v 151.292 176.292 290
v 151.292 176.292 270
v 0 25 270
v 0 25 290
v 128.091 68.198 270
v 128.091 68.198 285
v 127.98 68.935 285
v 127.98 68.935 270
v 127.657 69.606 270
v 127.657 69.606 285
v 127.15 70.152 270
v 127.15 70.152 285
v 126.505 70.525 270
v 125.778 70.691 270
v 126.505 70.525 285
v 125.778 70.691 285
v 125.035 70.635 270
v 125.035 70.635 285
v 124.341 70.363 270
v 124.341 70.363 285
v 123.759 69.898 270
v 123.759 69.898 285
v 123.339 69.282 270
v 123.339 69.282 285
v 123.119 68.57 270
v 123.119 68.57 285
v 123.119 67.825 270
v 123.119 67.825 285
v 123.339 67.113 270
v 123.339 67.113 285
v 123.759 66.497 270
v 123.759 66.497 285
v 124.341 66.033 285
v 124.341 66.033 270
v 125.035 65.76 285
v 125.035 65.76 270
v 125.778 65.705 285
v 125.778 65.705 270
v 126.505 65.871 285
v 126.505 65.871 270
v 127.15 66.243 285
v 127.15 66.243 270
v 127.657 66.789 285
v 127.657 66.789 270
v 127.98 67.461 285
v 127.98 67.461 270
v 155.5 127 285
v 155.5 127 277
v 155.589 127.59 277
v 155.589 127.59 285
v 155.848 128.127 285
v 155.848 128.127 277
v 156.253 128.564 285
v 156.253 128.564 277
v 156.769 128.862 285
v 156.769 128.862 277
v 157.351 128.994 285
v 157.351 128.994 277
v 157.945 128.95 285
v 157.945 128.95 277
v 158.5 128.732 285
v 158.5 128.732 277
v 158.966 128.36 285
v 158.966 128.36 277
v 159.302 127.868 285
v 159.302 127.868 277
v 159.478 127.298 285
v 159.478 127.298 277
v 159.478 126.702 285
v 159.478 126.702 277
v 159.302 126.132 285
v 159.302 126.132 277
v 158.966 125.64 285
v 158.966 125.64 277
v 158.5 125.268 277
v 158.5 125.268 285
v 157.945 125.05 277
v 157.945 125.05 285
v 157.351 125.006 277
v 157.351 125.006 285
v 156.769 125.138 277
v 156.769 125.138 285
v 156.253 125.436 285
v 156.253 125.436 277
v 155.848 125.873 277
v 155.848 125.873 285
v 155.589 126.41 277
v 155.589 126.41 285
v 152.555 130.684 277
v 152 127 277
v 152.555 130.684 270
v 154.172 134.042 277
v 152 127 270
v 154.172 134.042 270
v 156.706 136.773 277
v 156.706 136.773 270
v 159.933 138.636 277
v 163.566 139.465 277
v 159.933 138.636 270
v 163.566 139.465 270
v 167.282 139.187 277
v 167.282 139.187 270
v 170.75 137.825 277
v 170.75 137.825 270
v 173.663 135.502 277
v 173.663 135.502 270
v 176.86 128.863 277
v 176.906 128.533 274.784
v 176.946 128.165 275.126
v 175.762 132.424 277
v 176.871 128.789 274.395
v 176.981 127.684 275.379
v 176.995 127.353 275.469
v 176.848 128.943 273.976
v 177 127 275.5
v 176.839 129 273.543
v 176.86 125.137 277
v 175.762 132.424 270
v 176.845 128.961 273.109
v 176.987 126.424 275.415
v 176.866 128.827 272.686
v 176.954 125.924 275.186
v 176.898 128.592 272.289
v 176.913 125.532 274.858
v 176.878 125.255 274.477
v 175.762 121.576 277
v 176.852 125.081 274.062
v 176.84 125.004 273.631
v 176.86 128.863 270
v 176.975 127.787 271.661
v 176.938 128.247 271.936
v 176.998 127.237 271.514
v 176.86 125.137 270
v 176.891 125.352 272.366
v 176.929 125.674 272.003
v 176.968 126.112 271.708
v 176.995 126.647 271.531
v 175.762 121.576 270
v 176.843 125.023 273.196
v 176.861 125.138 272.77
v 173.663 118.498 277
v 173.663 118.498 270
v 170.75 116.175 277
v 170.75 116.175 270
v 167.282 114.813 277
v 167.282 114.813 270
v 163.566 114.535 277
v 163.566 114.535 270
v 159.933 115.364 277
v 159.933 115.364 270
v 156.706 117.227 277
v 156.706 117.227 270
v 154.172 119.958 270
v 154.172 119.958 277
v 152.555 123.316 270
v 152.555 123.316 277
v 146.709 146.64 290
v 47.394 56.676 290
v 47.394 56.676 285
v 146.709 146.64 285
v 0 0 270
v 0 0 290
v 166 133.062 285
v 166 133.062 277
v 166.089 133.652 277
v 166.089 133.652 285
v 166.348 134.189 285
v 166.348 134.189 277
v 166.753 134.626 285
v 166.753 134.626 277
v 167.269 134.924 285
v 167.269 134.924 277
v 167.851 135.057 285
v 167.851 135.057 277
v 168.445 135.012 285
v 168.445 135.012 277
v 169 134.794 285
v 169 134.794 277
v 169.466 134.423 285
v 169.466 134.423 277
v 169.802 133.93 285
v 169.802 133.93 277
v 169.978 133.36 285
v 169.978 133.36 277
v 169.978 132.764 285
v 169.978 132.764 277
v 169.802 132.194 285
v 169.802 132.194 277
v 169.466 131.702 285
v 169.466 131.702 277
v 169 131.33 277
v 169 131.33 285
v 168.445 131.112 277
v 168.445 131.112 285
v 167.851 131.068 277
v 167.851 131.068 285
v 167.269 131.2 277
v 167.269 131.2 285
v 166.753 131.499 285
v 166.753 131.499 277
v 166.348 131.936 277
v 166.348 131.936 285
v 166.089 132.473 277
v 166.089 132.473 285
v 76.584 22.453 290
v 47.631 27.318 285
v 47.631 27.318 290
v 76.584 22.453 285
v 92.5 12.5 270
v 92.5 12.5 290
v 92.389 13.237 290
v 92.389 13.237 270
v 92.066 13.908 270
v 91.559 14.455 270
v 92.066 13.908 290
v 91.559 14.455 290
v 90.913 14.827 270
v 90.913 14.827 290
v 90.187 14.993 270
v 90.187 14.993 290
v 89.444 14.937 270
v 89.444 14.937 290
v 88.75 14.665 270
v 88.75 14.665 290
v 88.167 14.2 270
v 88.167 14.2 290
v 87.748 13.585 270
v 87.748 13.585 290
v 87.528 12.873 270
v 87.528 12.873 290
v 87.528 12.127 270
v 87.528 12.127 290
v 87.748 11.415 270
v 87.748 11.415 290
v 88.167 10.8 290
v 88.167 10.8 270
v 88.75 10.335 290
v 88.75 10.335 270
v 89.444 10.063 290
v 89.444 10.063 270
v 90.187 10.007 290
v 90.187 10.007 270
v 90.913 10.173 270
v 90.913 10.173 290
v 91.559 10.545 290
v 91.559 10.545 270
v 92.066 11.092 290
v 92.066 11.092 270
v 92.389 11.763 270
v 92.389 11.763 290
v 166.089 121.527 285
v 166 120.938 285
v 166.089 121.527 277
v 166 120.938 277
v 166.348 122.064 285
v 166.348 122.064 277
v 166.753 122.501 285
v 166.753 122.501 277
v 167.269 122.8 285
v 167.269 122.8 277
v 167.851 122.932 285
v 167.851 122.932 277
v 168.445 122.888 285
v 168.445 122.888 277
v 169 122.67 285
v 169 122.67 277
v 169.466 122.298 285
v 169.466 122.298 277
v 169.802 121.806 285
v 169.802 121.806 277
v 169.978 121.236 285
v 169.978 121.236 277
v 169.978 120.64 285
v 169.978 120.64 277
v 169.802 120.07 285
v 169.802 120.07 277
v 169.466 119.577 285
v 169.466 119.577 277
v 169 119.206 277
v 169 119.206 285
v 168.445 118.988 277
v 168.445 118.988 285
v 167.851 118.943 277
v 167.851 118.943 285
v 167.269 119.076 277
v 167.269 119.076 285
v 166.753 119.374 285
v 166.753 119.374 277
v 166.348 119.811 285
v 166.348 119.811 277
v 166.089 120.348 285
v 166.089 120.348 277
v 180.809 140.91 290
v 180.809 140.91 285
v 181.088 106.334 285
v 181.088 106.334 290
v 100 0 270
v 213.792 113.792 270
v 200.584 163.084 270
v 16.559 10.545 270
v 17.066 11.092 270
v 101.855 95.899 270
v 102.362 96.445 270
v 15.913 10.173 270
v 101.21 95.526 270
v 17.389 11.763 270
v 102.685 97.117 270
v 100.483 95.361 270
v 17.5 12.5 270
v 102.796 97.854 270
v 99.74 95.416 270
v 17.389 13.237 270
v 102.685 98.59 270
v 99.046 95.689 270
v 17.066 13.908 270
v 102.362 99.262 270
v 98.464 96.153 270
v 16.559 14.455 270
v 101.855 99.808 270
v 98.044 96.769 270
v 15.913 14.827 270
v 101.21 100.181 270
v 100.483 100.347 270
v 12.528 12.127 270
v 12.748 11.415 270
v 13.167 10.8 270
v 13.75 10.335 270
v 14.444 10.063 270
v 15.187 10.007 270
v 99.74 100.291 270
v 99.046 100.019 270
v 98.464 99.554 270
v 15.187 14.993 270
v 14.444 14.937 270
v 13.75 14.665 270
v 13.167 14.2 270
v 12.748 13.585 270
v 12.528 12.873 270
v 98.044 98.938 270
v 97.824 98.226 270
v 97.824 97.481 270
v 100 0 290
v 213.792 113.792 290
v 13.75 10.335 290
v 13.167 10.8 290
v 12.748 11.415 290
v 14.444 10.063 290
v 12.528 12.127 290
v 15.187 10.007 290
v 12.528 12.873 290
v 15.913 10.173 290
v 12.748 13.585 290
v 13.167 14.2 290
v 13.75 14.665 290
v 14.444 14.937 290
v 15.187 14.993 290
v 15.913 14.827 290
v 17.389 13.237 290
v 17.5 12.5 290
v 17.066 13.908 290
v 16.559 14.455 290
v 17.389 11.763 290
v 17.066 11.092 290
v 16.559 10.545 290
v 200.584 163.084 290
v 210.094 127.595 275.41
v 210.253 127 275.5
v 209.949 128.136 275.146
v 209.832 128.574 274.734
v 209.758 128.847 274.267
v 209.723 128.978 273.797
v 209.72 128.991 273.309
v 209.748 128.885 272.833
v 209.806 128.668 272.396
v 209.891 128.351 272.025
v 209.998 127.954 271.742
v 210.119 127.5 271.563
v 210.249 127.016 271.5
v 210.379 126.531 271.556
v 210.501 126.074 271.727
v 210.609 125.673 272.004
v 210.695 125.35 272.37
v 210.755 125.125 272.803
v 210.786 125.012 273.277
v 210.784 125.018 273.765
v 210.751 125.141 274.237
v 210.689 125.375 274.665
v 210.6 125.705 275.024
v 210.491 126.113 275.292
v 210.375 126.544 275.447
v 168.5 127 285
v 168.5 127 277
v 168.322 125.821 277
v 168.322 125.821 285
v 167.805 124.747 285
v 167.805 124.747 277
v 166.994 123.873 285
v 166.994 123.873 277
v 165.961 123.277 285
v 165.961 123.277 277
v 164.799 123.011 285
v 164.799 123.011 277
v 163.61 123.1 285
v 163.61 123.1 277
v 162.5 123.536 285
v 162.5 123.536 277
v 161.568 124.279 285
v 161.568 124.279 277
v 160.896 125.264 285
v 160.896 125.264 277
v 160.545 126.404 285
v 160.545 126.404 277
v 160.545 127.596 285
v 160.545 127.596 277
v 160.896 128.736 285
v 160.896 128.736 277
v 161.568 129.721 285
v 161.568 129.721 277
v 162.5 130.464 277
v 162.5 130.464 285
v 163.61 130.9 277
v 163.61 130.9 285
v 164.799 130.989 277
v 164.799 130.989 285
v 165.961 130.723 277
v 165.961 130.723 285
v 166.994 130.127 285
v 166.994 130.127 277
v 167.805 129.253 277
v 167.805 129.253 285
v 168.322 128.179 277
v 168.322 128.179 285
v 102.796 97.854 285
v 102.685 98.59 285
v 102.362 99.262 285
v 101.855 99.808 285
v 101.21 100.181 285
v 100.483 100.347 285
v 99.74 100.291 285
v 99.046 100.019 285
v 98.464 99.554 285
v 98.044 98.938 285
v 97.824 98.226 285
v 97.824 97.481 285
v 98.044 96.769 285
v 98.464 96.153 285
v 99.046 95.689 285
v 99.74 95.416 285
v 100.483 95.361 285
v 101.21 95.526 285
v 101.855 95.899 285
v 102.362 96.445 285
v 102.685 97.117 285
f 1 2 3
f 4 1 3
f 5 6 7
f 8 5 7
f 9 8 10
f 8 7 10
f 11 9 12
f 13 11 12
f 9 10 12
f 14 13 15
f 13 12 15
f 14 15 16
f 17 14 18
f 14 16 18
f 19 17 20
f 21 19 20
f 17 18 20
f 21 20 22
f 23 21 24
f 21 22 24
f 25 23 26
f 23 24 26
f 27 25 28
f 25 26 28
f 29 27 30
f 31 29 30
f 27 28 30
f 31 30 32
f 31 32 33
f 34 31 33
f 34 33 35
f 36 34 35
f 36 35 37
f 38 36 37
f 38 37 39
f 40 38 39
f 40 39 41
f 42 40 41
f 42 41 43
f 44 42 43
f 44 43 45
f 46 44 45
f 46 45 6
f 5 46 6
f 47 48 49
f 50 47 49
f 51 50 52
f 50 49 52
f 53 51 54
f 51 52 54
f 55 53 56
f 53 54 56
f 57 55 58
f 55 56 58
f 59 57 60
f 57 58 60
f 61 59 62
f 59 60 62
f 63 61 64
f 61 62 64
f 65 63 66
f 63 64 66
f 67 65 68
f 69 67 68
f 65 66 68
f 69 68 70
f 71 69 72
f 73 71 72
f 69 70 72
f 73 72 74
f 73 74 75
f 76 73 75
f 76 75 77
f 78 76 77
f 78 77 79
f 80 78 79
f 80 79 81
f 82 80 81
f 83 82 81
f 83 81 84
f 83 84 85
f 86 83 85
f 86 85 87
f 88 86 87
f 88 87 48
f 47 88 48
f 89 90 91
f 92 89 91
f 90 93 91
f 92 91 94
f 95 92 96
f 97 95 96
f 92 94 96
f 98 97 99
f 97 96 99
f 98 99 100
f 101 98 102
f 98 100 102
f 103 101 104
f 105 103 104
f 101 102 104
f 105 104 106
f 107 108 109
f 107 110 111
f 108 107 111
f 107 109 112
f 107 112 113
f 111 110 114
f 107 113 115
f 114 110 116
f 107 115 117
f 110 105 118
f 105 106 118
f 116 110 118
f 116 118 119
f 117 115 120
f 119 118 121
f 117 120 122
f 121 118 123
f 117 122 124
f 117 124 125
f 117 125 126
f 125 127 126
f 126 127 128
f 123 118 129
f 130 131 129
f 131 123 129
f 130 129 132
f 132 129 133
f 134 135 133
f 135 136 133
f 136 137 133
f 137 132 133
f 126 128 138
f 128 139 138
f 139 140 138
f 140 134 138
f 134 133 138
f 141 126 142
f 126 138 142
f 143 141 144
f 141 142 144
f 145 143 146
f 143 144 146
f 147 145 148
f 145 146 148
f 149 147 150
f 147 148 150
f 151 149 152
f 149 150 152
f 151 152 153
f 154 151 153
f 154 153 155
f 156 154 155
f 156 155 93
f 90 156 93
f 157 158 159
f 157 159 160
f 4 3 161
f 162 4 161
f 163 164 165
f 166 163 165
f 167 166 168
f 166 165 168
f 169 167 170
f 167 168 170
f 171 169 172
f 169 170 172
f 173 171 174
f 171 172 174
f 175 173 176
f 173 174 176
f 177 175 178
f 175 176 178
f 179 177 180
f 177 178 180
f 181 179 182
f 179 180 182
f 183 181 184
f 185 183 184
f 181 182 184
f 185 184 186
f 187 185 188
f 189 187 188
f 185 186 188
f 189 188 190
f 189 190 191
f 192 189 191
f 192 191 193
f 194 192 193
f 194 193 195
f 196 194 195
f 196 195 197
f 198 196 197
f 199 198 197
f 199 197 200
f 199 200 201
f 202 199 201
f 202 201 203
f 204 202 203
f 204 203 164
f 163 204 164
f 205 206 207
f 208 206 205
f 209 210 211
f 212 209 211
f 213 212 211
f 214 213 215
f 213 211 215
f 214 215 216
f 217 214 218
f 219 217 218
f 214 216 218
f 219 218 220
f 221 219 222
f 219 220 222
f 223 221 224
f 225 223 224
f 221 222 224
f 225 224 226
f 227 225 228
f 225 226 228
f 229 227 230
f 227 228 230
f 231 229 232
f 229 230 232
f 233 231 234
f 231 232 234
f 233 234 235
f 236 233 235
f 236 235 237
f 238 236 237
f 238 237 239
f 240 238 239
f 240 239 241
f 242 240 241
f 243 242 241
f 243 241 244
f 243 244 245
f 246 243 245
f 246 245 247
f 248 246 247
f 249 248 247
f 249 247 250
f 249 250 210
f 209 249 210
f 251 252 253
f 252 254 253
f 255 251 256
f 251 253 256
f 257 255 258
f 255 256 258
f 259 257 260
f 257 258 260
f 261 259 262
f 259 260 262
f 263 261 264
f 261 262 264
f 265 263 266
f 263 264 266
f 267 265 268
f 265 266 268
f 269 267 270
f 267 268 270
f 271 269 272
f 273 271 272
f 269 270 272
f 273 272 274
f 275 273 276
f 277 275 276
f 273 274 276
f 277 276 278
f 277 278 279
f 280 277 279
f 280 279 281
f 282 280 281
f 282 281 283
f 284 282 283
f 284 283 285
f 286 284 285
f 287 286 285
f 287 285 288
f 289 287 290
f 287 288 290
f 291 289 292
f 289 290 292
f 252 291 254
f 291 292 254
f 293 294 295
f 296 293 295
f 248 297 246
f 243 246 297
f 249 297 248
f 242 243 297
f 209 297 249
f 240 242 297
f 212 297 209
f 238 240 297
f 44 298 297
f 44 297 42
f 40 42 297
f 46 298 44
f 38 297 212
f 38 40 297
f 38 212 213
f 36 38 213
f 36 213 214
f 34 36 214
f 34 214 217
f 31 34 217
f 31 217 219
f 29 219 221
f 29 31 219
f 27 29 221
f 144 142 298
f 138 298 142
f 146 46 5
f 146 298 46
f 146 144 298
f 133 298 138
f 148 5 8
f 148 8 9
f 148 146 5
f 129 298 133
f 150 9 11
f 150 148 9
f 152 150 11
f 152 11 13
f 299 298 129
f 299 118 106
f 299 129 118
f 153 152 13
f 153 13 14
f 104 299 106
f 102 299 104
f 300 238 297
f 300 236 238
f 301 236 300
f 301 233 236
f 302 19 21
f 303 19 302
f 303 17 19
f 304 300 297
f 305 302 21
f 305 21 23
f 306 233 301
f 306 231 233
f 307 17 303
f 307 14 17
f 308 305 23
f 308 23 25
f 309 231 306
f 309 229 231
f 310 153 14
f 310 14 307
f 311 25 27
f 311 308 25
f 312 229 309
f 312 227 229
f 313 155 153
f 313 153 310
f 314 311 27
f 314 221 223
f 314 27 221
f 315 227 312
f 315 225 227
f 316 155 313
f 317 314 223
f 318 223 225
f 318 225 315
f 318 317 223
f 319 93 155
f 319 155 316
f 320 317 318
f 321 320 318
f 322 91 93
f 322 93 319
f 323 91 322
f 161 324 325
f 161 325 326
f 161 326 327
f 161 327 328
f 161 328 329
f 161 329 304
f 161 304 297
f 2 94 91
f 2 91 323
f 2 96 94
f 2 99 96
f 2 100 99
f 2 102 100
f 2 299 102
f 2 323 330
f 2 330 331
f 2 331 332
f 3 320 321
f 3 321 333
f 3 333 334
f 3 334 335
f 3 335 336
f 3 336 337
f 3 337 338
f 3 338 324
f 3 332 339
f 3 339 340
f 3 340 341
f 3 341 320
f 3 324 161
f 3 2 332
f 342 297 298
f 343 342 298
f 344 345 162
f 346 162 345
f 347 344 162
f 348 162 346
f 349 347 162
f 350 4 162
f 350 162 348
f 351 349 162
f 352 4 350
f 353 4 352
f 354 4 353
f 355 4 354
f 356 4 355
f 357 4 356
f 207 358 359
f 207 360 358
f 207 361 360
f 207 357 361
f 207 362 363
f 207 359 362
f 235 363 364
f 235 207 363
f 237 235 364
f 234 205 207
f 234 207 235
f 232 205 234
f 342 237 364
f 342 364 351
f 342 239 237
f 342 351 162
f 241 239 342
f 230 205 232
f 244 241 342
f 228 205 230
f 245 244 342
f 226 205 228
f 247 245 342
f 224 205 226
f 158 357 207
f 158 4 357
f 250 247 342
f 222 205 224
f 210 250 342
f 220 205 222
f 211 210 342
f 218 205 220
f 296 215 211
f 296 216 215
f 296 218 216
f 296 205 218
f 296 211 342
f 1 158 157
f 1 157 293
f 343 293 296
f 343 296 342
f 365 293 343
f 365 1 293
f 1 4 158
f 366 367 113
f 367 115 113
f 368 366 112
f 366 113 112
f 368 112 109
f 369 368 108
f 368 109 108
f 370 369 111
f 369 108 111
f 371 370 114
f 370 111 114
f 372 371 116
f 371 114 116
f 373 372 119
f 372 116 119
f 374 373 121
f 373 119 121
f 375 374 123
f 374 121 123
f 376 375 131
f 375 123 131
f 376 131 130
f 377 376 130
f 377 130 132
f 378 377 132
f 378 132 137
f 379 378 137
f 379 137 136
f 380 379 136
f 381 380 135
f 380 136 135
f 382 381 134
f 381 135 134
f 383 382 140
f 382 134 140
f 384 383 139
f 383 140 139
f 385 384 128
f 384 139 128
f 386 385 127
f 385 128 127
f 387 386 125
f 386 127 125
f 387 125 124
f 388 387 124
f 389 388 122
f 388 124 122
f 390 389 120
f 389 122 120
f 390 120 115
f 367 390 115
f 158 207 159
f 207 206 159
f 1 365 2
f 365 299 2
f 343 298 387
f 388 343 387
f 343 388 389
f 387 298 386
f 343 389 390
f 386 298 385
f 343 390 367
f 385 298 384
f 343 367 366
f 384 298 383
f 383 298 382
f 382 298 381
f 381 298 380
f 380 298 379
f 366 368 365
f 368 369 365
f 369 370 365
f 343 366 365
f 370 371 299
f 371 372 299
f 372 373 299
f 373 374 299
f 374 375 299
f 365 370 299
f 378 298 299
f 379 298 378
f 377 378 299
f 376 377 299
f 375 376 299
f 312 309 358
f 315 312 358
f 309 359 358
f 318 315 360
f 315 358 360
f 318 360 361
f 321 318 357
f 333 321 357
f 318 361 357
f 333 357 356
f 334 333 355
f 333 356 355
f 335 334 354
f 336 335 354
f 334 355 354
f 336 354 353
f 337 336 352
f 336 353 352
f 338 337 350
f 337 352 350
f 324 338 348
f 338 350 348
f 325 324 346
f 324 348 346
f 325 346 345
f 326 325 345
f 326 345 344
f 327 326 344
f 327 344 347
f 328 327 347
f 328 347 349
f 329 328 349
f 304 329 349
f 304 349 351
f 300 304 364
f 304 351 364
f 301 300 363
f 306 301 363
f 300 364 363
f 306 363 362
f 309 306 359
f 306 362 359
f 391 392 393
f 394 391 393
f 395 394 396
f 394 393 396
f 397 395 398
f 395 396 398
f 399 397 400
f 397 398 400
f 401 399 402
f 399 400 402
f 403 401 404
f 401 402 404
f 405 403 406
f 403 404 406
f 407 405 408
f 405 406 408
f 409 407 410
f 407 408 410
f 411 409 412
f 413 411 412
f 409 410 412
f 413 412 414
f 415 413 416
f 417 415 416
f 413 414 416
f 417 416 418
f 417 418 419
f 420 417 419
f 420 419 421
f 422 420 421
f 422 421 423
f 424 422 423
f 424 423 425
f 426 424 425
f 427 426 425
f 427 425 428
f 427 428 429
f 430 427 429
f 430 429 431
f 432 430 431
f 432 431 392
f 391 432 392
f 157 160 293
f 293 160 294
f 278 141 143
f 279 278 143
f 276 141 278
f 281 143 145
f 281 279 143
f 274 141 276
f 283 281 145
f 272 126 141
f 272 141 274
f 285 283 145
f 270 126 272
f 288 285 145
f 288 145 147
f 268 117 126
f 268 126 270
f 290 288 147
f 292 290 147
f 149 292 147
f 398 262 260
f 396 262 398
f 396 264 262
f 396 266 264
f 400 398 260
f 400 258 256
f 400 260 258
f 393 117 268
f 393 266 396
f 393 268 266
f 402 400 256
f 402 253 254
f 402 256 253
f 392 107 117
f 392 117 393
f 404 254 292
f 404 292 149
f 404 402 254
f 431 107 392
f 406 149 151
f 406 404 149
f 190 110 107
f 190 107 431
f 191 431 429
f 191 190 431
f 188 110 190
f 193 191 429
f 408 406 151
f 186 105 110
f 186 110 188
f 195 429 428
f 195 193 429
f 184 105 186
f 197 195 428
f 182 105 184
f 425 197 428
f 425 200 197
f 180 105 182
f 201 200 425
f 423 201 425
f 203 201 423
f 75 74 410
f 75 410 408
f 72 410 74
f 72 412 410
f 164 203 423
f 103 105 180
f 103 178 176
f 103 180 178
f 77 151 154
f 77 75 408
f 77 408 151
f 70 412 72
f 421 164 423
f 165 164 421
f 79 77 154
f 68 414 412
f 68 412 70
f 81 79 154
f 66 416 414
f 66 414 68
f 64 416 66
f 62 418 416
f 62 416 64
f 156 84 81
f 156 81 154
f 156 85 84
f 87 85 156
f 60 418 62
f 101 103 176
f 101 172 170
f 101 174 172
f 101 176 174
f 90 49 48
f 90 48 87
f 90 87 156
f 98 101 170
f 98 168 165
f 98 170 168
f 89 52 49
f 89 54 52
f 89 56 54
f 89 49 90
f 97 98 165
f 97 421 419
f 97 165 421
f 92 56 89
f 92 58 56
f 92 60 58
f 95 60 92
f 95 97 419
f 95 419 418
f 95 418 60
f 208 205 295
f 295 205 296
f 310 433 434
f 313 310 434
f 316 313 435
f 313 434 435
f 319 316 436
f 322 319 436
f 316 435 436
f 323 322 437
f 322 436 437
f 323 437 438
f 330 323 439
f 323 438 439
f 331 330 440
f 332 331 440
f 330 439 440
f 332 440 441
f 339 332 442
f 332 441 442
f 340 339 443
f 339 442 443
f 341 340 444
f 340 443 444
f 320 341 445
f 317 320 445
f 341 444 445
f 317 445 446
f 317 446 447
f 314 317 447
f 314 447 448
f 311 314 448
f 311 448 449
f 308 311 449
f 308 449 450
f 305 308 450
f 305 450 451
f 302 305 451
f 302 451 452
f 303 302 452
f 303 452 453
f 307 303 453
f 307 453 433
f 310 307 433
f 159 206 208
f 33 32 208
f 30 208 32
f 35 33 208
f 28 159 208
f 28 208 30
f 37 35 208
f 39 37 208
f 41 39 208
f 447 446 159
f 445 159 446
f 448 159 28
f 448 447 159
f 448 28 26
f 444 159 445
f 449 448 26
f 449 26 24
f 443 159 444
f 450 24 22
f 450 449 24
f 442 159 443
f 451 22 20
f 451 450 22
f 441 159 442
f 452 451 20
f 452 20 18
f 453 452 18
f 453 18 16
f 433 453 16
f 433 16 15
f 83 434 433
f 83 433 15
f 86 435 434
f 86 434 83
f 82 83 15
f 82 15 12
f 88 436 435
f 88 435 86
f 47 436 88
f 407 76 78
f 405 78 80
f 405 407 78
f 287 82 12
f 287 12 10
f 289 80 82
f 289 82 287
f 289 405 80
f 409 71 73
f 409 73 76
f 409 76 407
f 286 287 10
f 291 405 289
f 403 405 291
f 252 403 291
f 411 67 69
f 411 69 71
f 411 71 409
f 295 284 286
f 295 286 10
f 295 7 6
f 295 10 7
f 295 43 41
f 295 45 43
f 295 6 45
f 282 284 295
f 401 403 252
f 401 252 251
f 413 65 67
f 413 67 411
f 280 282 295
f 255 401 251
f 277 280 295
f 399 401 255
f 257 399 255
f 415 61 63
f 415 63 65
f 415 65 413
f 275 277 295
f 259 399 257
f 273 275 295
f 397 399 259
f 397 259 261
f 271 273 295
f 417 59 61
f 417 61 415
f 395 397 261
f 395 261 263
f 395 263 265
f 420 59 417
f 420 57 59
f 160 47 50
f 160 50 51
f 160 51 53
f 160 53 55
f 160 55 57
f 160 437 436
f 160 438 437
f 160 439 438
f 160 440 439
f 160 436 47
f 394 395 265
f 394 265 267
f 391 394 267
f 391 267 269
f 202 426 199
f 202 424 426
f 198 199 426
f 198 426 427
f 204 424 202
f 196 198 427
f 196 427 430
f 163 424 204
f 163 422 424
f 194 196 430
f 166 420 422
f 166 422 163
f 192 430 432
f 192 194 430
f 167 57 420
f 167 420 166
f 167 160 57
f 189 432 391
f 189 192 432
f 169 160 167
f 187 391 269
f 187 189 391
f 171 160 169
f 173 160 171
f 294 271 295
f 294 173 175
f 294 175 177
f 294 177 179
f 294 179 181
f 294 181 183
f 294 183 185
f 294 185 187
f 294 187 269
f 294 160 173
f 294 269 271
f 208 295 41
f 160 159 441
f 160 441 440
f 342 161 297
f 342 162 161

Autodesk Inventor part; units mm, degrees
ref_plane "XZ Plane" through (0, 0, 0) normal (0, 1, 0) x (-1, 0, 0)
ref_plane "XY Plane" through (0, 0, 0) normal (0, 0, 1) x (1, 0, 0)
sketch "Sketch1" plane through (0, 0, 0) normal (0, 0, 1) x (1, 0, 0)
  line L0 (0, 0) -> (100, 0)
  line L1 (100, 0) -> (100, 25)
  line L2 (100, 25) -> (0, 25)
  line L3 (0, 25) -> (0, 0)
  line L4 (0, 25) -> (115.2078, 140.2078)
  line L5 (100, 0) -> (177.7078, 77.7078)
  line L6 (151.2922, 176.2922) -> (200.5844, 163.0844)
  line L7 (200.5844, 163.0844) -> (213.7922, 113.7922)
  line L8 (213.7922, 113.7922) -> (177.7078, 77.7078)
  line L9 (177.7078, 77.7078) -> (128.4156, 90.9156)
  line L10 (128.4156, 90.9156) -> (115.2078, 140.2078)
  line L11 (115.2078, 140.2078) -> (151.2922, 176.2922)
  circle A0 centre (164.5, 127) radius 4
  dimension "d0" = 100
  dimension "d1" = 25
  dimension "d6" = 8
  dimension "d8" = 45
  dimension "d15" = 127
extrude "Extrusion1" add sketch "Sketch1" along normal blind 20
sketch "Sketch2" plane through (0, 0, 20) normal (0, 0, 1) x (1, 0, 0)
  line L0 (0, 25) -> (0, 0) projected
  line L1 (0, 0) -> (100, 0) projected
  line L2 (0, 25) -> (100, 25)
  line L3 (100, 25) -> (100, 0)
  line L4 (100, 0) -> (0, 0)
  line L5 (0, 0) -> (0, 25)
  line L6 (100, 25) -> (125, 25)
  line L7 (100, 0) -> (213.7922, 113.7922) projected
  line L8 (100, 0) -> (125, 25)
extrude "Extrusion2" add sketch "Sketch2" along normal blind 250
sketch "Sketch4" plane through (0, 0, 270) normal (0, 0, 1) x (1, 0, 0)
  line L0 (0, 25) -> (125, 25) projected
  line L1 (125, 25) -> (213.7922, 113.7922) projected
  line L2 (213.7922, 113.7922) -> (200.5844, 163.0844) projected
  line L3 (200.5844, 163.0844) -> (151.2922, 176.2922) projected
  line L4 (151.2922, 176.2922) -> (0, 25) projected
  circle A0 centre (164.5, 127) radius 4 projected
  line L5 (100, 0) -> (125, 25) projected
  line L6 (125, 25) -> (0, 25) projected
  line L7 (0, 25) -> (0, 0) projected
  line L8 (0, 0) -> (100, 0) projected
extrude "Extrusion3" add sketch "Sketch4" along normal blind 20
sketch "Sketch5" plane through (0, 0, 0) normal (0, -1, 0) x (1, 0, 0)
  line L0 (0, 0) -> (100, 0) projected
  line L1 (100, 0) -> (100, 290) projected
  line L2 (0, 290) -> (100, 290) projected
  line L3 (0, 0) -> (0, 290) projected
  line L4 (0, 0) -> (-125.5737, 72.5)
  line L5 (-125.5737, 72.5) -> (-125.5737, 217.5)
  line L6 (-125.5737, 217.5) -> (0, 290)
  line L7 (0, 290) -> (125.5737, 217.5)
  line L8 (125.5737, 217.5) -> (125.5737, 72.5)
  line L9 (125.5737, 72.5) -> (0, 0)
  point P0 (0, 145)
extrude "Extrusion4" add sketch "Sketch5" against normal blind 25 contours L4 L5 L6 L3
sketch "Sketch6" plane through (0, 25, 20) normal (0, 1, 0) x (1, 0, 0)
  line L0 (100, 20) -> (100, -270) projected
  circle A0 centre (-24.528, -125) radius 3
  circle A1 centre (-31.528, -125) radius 1.5
  circle A2 centre (-21.028, -131.0622) radius 1.5
  circle A3 centre (-21.028, -118.9378) radius 1.5
  point P0 (0, 20)
  point P1 (100, -125)
  dimension "d18" = 6
  dimension "d19" = 124.528
  dimension "d20" = 3
  dimension "d21" = 7
  dimension "d24" = 360
extrude "Extrusion5" cut sketch "Sketch6" against normal through all
sketch "Sketch7" plane through (100, 0, 0) normal (0, -1, 0) x (1, 0, 0)
  circle A0 centre (-124.528, 145) radius 3 projected
  circle A1 centre (-124.528, 145) radius 12
  point P0 (-100, 0)
  dimension "d28" = 24
extrude "Extrusion6" cut sketch "Sketch7" against normal blind 5
sketch "Sketch8" plane through (0, 0, 270) normal (0, 0, -1) x (-1, 0, 0)
  circle A0 centre (-164.5, 127) radius 4 projected
  circle A1 centre (-164.5, 127) radius 12.5
  point P0 (0, 0)
  dimension "d31" = 25
extrude "Extrusion7" cut sketch "Sketch8" against normal blind 7
sketch "Sketch10" plane through (164.5, 127, 277) normal (0, 0, -1) x (-1, 0, 0)
  circle A0 centre (7, 0) radius 2
  circle A1 centre (0, 0) radius 4 projected
  circle A2 centre (-3.5, 6.0622) radius 2
  circle A3 centre (-3.5, -6.0622) radius 2
  point P0 (164.5, -127)
  dimension "d34" = 4
  dimension "d37" = 360
  dimension "d39" = 7
extrude "Extrusion8" cut sketch "Sketch10" against normal through all
sketch "Sketch11" plane through (0, 0, 290) normal (0, 0, 1) x (1, 0, 0)
  circle A0 centre (168, 133.0622) radius 2 projected
  circle A1 centre (164.5, 127) radius 4 projected
  circle A2 centre (168, 133.0622) radius 4
  circle A3 centre (157.5, 127) radius 4
  circle A4 centre (168, 120.9378) radius 4
  point P0 (0, 0)
  dimension "d42" = 8
  dimension "d45" = 360
extrude "Extrusion9" cut sketch "Sketch11" against normal blind 3 contours A0 | A1 A4 A3 A2 | A2 A1 | A1 A2 | A4 A1 | A1 A4 | A3 A1 | A1 A3
ref_plane "Work Plane1" through (164.5, 127, 270) normal (1, 0, 0) x (0, 0, 1)
sketch "Sketch12" plane through (164.5, 127, 270) normal (1, 0, 0) x (0, 0, 1)
  line L0 (17, -1.9365) -> (17, 1.9365) projected
  line L1 (17, 1.9365) -> (20, 1.9365) projected
  line L2 (20, 3.9993) -> (20, 1.9365) projected
  line L3 (20, 3.9993) -> (17, 3.9993) projected
  line L4 (17, 3.9993) -> (17, 2.0628) projected
  line L5 (17, 2.0628) -> (20, 2.0628) projected
  line L6 (20, -2.0628) -> (20, 2.0628) projected
  line L7 (20, -2.0628) -> (17, -2.0628) projected
  line L8 (17, -2.0628) -> (17, -3.9993) projected
  line L9 (17, -3.9993) -> (20, -3.9993) projected
  line L10 (20, -1.9365) -> (20, -3.9993) projected
  line L11 (20, -1.9365) -> (17, -1.9365) projected
  line L12 (7, 4) -> (7, -4) projected
  line L13 (7, -12.5) -> (7, 12.5) projected
  line L14 (0, -12.5) -> (0, 12.5) projected
  circle A0 centre (3.5, 0) radius 2
  line L15 (0, -12.5) -> (7, -12.5) projected
  point P0 (-270, 127)
  point P1 (7, 0)
  point P2 (3.5, -12.5)
  dimension "d50" = 4
extrude "Extrusion10" cut sketch "Sketch12" along normal through all contours A0
sketch "Sketch13" plane through (0, 0, 270) normal (0, 0, -1) x (-1, 0, 0)
  circle A0 centre (-164.5, 127) radius 4 projected
  line L0 (0, 0) -> (-100, 0) projected
  line L1 (0, 25) -> (0, 0) projected
  line L2 (-151.2922, 176.2922) -> (0, 25) projected
  line L3 (-200.5844, 163.0844) -> (-151.2922, 176.2922) projected
  line L4 (-213.7922, 113.7922) -> (-200.5844, 163.0844) projected
  line L5 (-100, 0) -> (-213.7922, 113.7922) projected
  line L6 (125.5737, 0) -> (0, 0) projected
  line L7 (125.5737, 0) -> (125.5737, 25) projected
  line L8 (0, 25) -> (125.5737, 25) projected
  line L9 (0, 25) -> (0, 0) projected
extrude "Extrusion11" cut sketch "Sketch13" along normal through all
sketch "Sketch14" plane through (0, 0, 270) normal (0, 0, -1) x (-1, 0, 0)
  line L0 (-151.2922, 176.2922) -> (0, 25) projected
  line L1 (0, 25) -> (0, 0) projected
  line L2 (0, 25) -> (0, 0)
  line L3 (0, 25) -> (34.641, 25) projected
  line L4 (34.641, 25) -> (34.641, 0) projected
  line L5 (34.641, 25) -> (0, 25) projected
  line L6 (0, 25) -> (34.641, 25)
  line L7 (34.641, 0) -> (-100, 0) projected
  line L8 (34.641, 25) -> (34.641, 0)
  line L9 (34.641, 0) -> (0, 0)
extrude "Extrusion12" cut sketch "Sketch14" against normal through all
sketch "Sketch15" plane through (0, 0, 290) normal (0, 0, 1) x (1, 0, 0)
  line L0 (15, 12.5) -> (90, 12.5) construction
  line L1 (0, 0) -> (100, 0) projected
  circle A0 centre (15, 12.5) radius 2.5
  circle A1 centre (90, 12.5) radius 2.5
  dimension "d57" = 12.5
  dimension "d58" = 10
  dimension "d59" = 75
  dimension "d60" = 5
  dimension "d61" = 5
extrude "Extrusion13" cut sketch "Sketch15" against normal through all
sketch "Sketch16" plane through (0, 0, 290) normal (0, 0, 1) x (1, 0, 0)
  arc A0 (167.9271, 124.9372) -> (167.9271, 129.0628) centre (164.5, 127) ccw projected
  circle A1 centre (164.5, 127) radius 26.5
  circle A2 centre (62.5, 40) radius 22.5
  line L0 (0, 25) -> (125, 25) construction
  line L1 (100, 0) -> (213.7922, 113.7922) projected
  line L2 (47.3944, 56.6755) -> (146.709, 146.64)
  line L3 (76.584, 22.4532) -> (181.0879, 106.3338)
  point P0 (0, 0)
  point P1 (62.5, 25)
  dimension "d64" = 53
  dimension "d65" = 45
  dimension "d67" = 15
extrude "Extrusion14" cut sketch "Sketch16" against normal blind 5
sketch "Sketch17" plane through (0, 0, 285) normal (0, 0, 1) x (1, 0, 0)
  line L0 (47.3944, 56.6755) -> (146.709, 146.64) construction
  line L1 (181.0879, 106.3338) -> (76.584, 22.4532) construction
  line L2 (97.0517, 101.6578) -> (128.8359, 64.3935) construction
  circle A0 centre (100.2965, 97.8536) radius 2.5
  circle A1 centre (125.5912, 68.1977) radius 2.5
  point P0 (0, 0)
  dimension "d70" = 5
  dimension "d71" = 5
  dimension "d72" = 5
  dimension "d73" = 5
extrude "Extrusion15" cut sketch "Sketch17" against normal through all
sketch "Sketch18" plane through (0, 0, 285) normal (0, 0, 1) x (1, 0, 0)
  arc A0 (181.0879, 106.3338) -> (146.709, 146.64) centre (164.5, 127) ccw projected
  line L0 (146.709, 146.64) -> (180.8089, 140.9105)
  line L1 (180.8089, 140.9105) -> (181.0879, 106.3338)
  arc A1 (47.3944, 56.6755) -> (76.584, 22.4532) centre (62.5, 40) ccw projected
  line L2 (62.5, 40) -> (180.8089, 140.9105)
  point P0 (0, 0)
  dimension "d76" = 100
extrude "Extrusion16" add sketch "Sketch18" along normal blind 5
sketch "Sketch19" plane through (0, 0, 290) normal (0, 0, 1) x (1, 0, 0)
  arc A0 (47.3944, 56.6755) -> (76.584, 22.4532) centre (62.5, 40) ccw projected
  line L0 (47.3944, 56.6755) -> (146.709, 146.64) projected
  line L1 (47.3944, 56.6755) -> (76.584, 22.4532)
  point P0 (0, 0)
  dimension "d0" = 100
extrude "Extrusion17" add sketch "Sketch19" against normal blind 5
sketch "Sketch20" plane through (0, 0, 285) normal (0, 0, 1) x (1, 0, 0)
  line L0 (47.3944, 56.6755) -> (76.584, 22.4532) projected
  circle A0 centre (164.5, 127) radius 4 projected
  circle A1 centre (164.5, 127) radius 4 projected
  line L1 (164.5, 127) -> (47.6313, 27.3179)
  line L2 (47.6313, 27.3179) -> (47.3944, 56.6755)
  line L3 (47.6313, 27.3179) -> (76.584, 22.4532)
  point P0 (0, 0)
  point P1 (61.9892, 39.5643)
  dimension "d81" = 100
extrude "Extrusion18" cut sketch "Sketch20" along normal through all contours L0 L1 L2 | L0 L3 L1
properties part number "HA02" material "ABS Plastic"
